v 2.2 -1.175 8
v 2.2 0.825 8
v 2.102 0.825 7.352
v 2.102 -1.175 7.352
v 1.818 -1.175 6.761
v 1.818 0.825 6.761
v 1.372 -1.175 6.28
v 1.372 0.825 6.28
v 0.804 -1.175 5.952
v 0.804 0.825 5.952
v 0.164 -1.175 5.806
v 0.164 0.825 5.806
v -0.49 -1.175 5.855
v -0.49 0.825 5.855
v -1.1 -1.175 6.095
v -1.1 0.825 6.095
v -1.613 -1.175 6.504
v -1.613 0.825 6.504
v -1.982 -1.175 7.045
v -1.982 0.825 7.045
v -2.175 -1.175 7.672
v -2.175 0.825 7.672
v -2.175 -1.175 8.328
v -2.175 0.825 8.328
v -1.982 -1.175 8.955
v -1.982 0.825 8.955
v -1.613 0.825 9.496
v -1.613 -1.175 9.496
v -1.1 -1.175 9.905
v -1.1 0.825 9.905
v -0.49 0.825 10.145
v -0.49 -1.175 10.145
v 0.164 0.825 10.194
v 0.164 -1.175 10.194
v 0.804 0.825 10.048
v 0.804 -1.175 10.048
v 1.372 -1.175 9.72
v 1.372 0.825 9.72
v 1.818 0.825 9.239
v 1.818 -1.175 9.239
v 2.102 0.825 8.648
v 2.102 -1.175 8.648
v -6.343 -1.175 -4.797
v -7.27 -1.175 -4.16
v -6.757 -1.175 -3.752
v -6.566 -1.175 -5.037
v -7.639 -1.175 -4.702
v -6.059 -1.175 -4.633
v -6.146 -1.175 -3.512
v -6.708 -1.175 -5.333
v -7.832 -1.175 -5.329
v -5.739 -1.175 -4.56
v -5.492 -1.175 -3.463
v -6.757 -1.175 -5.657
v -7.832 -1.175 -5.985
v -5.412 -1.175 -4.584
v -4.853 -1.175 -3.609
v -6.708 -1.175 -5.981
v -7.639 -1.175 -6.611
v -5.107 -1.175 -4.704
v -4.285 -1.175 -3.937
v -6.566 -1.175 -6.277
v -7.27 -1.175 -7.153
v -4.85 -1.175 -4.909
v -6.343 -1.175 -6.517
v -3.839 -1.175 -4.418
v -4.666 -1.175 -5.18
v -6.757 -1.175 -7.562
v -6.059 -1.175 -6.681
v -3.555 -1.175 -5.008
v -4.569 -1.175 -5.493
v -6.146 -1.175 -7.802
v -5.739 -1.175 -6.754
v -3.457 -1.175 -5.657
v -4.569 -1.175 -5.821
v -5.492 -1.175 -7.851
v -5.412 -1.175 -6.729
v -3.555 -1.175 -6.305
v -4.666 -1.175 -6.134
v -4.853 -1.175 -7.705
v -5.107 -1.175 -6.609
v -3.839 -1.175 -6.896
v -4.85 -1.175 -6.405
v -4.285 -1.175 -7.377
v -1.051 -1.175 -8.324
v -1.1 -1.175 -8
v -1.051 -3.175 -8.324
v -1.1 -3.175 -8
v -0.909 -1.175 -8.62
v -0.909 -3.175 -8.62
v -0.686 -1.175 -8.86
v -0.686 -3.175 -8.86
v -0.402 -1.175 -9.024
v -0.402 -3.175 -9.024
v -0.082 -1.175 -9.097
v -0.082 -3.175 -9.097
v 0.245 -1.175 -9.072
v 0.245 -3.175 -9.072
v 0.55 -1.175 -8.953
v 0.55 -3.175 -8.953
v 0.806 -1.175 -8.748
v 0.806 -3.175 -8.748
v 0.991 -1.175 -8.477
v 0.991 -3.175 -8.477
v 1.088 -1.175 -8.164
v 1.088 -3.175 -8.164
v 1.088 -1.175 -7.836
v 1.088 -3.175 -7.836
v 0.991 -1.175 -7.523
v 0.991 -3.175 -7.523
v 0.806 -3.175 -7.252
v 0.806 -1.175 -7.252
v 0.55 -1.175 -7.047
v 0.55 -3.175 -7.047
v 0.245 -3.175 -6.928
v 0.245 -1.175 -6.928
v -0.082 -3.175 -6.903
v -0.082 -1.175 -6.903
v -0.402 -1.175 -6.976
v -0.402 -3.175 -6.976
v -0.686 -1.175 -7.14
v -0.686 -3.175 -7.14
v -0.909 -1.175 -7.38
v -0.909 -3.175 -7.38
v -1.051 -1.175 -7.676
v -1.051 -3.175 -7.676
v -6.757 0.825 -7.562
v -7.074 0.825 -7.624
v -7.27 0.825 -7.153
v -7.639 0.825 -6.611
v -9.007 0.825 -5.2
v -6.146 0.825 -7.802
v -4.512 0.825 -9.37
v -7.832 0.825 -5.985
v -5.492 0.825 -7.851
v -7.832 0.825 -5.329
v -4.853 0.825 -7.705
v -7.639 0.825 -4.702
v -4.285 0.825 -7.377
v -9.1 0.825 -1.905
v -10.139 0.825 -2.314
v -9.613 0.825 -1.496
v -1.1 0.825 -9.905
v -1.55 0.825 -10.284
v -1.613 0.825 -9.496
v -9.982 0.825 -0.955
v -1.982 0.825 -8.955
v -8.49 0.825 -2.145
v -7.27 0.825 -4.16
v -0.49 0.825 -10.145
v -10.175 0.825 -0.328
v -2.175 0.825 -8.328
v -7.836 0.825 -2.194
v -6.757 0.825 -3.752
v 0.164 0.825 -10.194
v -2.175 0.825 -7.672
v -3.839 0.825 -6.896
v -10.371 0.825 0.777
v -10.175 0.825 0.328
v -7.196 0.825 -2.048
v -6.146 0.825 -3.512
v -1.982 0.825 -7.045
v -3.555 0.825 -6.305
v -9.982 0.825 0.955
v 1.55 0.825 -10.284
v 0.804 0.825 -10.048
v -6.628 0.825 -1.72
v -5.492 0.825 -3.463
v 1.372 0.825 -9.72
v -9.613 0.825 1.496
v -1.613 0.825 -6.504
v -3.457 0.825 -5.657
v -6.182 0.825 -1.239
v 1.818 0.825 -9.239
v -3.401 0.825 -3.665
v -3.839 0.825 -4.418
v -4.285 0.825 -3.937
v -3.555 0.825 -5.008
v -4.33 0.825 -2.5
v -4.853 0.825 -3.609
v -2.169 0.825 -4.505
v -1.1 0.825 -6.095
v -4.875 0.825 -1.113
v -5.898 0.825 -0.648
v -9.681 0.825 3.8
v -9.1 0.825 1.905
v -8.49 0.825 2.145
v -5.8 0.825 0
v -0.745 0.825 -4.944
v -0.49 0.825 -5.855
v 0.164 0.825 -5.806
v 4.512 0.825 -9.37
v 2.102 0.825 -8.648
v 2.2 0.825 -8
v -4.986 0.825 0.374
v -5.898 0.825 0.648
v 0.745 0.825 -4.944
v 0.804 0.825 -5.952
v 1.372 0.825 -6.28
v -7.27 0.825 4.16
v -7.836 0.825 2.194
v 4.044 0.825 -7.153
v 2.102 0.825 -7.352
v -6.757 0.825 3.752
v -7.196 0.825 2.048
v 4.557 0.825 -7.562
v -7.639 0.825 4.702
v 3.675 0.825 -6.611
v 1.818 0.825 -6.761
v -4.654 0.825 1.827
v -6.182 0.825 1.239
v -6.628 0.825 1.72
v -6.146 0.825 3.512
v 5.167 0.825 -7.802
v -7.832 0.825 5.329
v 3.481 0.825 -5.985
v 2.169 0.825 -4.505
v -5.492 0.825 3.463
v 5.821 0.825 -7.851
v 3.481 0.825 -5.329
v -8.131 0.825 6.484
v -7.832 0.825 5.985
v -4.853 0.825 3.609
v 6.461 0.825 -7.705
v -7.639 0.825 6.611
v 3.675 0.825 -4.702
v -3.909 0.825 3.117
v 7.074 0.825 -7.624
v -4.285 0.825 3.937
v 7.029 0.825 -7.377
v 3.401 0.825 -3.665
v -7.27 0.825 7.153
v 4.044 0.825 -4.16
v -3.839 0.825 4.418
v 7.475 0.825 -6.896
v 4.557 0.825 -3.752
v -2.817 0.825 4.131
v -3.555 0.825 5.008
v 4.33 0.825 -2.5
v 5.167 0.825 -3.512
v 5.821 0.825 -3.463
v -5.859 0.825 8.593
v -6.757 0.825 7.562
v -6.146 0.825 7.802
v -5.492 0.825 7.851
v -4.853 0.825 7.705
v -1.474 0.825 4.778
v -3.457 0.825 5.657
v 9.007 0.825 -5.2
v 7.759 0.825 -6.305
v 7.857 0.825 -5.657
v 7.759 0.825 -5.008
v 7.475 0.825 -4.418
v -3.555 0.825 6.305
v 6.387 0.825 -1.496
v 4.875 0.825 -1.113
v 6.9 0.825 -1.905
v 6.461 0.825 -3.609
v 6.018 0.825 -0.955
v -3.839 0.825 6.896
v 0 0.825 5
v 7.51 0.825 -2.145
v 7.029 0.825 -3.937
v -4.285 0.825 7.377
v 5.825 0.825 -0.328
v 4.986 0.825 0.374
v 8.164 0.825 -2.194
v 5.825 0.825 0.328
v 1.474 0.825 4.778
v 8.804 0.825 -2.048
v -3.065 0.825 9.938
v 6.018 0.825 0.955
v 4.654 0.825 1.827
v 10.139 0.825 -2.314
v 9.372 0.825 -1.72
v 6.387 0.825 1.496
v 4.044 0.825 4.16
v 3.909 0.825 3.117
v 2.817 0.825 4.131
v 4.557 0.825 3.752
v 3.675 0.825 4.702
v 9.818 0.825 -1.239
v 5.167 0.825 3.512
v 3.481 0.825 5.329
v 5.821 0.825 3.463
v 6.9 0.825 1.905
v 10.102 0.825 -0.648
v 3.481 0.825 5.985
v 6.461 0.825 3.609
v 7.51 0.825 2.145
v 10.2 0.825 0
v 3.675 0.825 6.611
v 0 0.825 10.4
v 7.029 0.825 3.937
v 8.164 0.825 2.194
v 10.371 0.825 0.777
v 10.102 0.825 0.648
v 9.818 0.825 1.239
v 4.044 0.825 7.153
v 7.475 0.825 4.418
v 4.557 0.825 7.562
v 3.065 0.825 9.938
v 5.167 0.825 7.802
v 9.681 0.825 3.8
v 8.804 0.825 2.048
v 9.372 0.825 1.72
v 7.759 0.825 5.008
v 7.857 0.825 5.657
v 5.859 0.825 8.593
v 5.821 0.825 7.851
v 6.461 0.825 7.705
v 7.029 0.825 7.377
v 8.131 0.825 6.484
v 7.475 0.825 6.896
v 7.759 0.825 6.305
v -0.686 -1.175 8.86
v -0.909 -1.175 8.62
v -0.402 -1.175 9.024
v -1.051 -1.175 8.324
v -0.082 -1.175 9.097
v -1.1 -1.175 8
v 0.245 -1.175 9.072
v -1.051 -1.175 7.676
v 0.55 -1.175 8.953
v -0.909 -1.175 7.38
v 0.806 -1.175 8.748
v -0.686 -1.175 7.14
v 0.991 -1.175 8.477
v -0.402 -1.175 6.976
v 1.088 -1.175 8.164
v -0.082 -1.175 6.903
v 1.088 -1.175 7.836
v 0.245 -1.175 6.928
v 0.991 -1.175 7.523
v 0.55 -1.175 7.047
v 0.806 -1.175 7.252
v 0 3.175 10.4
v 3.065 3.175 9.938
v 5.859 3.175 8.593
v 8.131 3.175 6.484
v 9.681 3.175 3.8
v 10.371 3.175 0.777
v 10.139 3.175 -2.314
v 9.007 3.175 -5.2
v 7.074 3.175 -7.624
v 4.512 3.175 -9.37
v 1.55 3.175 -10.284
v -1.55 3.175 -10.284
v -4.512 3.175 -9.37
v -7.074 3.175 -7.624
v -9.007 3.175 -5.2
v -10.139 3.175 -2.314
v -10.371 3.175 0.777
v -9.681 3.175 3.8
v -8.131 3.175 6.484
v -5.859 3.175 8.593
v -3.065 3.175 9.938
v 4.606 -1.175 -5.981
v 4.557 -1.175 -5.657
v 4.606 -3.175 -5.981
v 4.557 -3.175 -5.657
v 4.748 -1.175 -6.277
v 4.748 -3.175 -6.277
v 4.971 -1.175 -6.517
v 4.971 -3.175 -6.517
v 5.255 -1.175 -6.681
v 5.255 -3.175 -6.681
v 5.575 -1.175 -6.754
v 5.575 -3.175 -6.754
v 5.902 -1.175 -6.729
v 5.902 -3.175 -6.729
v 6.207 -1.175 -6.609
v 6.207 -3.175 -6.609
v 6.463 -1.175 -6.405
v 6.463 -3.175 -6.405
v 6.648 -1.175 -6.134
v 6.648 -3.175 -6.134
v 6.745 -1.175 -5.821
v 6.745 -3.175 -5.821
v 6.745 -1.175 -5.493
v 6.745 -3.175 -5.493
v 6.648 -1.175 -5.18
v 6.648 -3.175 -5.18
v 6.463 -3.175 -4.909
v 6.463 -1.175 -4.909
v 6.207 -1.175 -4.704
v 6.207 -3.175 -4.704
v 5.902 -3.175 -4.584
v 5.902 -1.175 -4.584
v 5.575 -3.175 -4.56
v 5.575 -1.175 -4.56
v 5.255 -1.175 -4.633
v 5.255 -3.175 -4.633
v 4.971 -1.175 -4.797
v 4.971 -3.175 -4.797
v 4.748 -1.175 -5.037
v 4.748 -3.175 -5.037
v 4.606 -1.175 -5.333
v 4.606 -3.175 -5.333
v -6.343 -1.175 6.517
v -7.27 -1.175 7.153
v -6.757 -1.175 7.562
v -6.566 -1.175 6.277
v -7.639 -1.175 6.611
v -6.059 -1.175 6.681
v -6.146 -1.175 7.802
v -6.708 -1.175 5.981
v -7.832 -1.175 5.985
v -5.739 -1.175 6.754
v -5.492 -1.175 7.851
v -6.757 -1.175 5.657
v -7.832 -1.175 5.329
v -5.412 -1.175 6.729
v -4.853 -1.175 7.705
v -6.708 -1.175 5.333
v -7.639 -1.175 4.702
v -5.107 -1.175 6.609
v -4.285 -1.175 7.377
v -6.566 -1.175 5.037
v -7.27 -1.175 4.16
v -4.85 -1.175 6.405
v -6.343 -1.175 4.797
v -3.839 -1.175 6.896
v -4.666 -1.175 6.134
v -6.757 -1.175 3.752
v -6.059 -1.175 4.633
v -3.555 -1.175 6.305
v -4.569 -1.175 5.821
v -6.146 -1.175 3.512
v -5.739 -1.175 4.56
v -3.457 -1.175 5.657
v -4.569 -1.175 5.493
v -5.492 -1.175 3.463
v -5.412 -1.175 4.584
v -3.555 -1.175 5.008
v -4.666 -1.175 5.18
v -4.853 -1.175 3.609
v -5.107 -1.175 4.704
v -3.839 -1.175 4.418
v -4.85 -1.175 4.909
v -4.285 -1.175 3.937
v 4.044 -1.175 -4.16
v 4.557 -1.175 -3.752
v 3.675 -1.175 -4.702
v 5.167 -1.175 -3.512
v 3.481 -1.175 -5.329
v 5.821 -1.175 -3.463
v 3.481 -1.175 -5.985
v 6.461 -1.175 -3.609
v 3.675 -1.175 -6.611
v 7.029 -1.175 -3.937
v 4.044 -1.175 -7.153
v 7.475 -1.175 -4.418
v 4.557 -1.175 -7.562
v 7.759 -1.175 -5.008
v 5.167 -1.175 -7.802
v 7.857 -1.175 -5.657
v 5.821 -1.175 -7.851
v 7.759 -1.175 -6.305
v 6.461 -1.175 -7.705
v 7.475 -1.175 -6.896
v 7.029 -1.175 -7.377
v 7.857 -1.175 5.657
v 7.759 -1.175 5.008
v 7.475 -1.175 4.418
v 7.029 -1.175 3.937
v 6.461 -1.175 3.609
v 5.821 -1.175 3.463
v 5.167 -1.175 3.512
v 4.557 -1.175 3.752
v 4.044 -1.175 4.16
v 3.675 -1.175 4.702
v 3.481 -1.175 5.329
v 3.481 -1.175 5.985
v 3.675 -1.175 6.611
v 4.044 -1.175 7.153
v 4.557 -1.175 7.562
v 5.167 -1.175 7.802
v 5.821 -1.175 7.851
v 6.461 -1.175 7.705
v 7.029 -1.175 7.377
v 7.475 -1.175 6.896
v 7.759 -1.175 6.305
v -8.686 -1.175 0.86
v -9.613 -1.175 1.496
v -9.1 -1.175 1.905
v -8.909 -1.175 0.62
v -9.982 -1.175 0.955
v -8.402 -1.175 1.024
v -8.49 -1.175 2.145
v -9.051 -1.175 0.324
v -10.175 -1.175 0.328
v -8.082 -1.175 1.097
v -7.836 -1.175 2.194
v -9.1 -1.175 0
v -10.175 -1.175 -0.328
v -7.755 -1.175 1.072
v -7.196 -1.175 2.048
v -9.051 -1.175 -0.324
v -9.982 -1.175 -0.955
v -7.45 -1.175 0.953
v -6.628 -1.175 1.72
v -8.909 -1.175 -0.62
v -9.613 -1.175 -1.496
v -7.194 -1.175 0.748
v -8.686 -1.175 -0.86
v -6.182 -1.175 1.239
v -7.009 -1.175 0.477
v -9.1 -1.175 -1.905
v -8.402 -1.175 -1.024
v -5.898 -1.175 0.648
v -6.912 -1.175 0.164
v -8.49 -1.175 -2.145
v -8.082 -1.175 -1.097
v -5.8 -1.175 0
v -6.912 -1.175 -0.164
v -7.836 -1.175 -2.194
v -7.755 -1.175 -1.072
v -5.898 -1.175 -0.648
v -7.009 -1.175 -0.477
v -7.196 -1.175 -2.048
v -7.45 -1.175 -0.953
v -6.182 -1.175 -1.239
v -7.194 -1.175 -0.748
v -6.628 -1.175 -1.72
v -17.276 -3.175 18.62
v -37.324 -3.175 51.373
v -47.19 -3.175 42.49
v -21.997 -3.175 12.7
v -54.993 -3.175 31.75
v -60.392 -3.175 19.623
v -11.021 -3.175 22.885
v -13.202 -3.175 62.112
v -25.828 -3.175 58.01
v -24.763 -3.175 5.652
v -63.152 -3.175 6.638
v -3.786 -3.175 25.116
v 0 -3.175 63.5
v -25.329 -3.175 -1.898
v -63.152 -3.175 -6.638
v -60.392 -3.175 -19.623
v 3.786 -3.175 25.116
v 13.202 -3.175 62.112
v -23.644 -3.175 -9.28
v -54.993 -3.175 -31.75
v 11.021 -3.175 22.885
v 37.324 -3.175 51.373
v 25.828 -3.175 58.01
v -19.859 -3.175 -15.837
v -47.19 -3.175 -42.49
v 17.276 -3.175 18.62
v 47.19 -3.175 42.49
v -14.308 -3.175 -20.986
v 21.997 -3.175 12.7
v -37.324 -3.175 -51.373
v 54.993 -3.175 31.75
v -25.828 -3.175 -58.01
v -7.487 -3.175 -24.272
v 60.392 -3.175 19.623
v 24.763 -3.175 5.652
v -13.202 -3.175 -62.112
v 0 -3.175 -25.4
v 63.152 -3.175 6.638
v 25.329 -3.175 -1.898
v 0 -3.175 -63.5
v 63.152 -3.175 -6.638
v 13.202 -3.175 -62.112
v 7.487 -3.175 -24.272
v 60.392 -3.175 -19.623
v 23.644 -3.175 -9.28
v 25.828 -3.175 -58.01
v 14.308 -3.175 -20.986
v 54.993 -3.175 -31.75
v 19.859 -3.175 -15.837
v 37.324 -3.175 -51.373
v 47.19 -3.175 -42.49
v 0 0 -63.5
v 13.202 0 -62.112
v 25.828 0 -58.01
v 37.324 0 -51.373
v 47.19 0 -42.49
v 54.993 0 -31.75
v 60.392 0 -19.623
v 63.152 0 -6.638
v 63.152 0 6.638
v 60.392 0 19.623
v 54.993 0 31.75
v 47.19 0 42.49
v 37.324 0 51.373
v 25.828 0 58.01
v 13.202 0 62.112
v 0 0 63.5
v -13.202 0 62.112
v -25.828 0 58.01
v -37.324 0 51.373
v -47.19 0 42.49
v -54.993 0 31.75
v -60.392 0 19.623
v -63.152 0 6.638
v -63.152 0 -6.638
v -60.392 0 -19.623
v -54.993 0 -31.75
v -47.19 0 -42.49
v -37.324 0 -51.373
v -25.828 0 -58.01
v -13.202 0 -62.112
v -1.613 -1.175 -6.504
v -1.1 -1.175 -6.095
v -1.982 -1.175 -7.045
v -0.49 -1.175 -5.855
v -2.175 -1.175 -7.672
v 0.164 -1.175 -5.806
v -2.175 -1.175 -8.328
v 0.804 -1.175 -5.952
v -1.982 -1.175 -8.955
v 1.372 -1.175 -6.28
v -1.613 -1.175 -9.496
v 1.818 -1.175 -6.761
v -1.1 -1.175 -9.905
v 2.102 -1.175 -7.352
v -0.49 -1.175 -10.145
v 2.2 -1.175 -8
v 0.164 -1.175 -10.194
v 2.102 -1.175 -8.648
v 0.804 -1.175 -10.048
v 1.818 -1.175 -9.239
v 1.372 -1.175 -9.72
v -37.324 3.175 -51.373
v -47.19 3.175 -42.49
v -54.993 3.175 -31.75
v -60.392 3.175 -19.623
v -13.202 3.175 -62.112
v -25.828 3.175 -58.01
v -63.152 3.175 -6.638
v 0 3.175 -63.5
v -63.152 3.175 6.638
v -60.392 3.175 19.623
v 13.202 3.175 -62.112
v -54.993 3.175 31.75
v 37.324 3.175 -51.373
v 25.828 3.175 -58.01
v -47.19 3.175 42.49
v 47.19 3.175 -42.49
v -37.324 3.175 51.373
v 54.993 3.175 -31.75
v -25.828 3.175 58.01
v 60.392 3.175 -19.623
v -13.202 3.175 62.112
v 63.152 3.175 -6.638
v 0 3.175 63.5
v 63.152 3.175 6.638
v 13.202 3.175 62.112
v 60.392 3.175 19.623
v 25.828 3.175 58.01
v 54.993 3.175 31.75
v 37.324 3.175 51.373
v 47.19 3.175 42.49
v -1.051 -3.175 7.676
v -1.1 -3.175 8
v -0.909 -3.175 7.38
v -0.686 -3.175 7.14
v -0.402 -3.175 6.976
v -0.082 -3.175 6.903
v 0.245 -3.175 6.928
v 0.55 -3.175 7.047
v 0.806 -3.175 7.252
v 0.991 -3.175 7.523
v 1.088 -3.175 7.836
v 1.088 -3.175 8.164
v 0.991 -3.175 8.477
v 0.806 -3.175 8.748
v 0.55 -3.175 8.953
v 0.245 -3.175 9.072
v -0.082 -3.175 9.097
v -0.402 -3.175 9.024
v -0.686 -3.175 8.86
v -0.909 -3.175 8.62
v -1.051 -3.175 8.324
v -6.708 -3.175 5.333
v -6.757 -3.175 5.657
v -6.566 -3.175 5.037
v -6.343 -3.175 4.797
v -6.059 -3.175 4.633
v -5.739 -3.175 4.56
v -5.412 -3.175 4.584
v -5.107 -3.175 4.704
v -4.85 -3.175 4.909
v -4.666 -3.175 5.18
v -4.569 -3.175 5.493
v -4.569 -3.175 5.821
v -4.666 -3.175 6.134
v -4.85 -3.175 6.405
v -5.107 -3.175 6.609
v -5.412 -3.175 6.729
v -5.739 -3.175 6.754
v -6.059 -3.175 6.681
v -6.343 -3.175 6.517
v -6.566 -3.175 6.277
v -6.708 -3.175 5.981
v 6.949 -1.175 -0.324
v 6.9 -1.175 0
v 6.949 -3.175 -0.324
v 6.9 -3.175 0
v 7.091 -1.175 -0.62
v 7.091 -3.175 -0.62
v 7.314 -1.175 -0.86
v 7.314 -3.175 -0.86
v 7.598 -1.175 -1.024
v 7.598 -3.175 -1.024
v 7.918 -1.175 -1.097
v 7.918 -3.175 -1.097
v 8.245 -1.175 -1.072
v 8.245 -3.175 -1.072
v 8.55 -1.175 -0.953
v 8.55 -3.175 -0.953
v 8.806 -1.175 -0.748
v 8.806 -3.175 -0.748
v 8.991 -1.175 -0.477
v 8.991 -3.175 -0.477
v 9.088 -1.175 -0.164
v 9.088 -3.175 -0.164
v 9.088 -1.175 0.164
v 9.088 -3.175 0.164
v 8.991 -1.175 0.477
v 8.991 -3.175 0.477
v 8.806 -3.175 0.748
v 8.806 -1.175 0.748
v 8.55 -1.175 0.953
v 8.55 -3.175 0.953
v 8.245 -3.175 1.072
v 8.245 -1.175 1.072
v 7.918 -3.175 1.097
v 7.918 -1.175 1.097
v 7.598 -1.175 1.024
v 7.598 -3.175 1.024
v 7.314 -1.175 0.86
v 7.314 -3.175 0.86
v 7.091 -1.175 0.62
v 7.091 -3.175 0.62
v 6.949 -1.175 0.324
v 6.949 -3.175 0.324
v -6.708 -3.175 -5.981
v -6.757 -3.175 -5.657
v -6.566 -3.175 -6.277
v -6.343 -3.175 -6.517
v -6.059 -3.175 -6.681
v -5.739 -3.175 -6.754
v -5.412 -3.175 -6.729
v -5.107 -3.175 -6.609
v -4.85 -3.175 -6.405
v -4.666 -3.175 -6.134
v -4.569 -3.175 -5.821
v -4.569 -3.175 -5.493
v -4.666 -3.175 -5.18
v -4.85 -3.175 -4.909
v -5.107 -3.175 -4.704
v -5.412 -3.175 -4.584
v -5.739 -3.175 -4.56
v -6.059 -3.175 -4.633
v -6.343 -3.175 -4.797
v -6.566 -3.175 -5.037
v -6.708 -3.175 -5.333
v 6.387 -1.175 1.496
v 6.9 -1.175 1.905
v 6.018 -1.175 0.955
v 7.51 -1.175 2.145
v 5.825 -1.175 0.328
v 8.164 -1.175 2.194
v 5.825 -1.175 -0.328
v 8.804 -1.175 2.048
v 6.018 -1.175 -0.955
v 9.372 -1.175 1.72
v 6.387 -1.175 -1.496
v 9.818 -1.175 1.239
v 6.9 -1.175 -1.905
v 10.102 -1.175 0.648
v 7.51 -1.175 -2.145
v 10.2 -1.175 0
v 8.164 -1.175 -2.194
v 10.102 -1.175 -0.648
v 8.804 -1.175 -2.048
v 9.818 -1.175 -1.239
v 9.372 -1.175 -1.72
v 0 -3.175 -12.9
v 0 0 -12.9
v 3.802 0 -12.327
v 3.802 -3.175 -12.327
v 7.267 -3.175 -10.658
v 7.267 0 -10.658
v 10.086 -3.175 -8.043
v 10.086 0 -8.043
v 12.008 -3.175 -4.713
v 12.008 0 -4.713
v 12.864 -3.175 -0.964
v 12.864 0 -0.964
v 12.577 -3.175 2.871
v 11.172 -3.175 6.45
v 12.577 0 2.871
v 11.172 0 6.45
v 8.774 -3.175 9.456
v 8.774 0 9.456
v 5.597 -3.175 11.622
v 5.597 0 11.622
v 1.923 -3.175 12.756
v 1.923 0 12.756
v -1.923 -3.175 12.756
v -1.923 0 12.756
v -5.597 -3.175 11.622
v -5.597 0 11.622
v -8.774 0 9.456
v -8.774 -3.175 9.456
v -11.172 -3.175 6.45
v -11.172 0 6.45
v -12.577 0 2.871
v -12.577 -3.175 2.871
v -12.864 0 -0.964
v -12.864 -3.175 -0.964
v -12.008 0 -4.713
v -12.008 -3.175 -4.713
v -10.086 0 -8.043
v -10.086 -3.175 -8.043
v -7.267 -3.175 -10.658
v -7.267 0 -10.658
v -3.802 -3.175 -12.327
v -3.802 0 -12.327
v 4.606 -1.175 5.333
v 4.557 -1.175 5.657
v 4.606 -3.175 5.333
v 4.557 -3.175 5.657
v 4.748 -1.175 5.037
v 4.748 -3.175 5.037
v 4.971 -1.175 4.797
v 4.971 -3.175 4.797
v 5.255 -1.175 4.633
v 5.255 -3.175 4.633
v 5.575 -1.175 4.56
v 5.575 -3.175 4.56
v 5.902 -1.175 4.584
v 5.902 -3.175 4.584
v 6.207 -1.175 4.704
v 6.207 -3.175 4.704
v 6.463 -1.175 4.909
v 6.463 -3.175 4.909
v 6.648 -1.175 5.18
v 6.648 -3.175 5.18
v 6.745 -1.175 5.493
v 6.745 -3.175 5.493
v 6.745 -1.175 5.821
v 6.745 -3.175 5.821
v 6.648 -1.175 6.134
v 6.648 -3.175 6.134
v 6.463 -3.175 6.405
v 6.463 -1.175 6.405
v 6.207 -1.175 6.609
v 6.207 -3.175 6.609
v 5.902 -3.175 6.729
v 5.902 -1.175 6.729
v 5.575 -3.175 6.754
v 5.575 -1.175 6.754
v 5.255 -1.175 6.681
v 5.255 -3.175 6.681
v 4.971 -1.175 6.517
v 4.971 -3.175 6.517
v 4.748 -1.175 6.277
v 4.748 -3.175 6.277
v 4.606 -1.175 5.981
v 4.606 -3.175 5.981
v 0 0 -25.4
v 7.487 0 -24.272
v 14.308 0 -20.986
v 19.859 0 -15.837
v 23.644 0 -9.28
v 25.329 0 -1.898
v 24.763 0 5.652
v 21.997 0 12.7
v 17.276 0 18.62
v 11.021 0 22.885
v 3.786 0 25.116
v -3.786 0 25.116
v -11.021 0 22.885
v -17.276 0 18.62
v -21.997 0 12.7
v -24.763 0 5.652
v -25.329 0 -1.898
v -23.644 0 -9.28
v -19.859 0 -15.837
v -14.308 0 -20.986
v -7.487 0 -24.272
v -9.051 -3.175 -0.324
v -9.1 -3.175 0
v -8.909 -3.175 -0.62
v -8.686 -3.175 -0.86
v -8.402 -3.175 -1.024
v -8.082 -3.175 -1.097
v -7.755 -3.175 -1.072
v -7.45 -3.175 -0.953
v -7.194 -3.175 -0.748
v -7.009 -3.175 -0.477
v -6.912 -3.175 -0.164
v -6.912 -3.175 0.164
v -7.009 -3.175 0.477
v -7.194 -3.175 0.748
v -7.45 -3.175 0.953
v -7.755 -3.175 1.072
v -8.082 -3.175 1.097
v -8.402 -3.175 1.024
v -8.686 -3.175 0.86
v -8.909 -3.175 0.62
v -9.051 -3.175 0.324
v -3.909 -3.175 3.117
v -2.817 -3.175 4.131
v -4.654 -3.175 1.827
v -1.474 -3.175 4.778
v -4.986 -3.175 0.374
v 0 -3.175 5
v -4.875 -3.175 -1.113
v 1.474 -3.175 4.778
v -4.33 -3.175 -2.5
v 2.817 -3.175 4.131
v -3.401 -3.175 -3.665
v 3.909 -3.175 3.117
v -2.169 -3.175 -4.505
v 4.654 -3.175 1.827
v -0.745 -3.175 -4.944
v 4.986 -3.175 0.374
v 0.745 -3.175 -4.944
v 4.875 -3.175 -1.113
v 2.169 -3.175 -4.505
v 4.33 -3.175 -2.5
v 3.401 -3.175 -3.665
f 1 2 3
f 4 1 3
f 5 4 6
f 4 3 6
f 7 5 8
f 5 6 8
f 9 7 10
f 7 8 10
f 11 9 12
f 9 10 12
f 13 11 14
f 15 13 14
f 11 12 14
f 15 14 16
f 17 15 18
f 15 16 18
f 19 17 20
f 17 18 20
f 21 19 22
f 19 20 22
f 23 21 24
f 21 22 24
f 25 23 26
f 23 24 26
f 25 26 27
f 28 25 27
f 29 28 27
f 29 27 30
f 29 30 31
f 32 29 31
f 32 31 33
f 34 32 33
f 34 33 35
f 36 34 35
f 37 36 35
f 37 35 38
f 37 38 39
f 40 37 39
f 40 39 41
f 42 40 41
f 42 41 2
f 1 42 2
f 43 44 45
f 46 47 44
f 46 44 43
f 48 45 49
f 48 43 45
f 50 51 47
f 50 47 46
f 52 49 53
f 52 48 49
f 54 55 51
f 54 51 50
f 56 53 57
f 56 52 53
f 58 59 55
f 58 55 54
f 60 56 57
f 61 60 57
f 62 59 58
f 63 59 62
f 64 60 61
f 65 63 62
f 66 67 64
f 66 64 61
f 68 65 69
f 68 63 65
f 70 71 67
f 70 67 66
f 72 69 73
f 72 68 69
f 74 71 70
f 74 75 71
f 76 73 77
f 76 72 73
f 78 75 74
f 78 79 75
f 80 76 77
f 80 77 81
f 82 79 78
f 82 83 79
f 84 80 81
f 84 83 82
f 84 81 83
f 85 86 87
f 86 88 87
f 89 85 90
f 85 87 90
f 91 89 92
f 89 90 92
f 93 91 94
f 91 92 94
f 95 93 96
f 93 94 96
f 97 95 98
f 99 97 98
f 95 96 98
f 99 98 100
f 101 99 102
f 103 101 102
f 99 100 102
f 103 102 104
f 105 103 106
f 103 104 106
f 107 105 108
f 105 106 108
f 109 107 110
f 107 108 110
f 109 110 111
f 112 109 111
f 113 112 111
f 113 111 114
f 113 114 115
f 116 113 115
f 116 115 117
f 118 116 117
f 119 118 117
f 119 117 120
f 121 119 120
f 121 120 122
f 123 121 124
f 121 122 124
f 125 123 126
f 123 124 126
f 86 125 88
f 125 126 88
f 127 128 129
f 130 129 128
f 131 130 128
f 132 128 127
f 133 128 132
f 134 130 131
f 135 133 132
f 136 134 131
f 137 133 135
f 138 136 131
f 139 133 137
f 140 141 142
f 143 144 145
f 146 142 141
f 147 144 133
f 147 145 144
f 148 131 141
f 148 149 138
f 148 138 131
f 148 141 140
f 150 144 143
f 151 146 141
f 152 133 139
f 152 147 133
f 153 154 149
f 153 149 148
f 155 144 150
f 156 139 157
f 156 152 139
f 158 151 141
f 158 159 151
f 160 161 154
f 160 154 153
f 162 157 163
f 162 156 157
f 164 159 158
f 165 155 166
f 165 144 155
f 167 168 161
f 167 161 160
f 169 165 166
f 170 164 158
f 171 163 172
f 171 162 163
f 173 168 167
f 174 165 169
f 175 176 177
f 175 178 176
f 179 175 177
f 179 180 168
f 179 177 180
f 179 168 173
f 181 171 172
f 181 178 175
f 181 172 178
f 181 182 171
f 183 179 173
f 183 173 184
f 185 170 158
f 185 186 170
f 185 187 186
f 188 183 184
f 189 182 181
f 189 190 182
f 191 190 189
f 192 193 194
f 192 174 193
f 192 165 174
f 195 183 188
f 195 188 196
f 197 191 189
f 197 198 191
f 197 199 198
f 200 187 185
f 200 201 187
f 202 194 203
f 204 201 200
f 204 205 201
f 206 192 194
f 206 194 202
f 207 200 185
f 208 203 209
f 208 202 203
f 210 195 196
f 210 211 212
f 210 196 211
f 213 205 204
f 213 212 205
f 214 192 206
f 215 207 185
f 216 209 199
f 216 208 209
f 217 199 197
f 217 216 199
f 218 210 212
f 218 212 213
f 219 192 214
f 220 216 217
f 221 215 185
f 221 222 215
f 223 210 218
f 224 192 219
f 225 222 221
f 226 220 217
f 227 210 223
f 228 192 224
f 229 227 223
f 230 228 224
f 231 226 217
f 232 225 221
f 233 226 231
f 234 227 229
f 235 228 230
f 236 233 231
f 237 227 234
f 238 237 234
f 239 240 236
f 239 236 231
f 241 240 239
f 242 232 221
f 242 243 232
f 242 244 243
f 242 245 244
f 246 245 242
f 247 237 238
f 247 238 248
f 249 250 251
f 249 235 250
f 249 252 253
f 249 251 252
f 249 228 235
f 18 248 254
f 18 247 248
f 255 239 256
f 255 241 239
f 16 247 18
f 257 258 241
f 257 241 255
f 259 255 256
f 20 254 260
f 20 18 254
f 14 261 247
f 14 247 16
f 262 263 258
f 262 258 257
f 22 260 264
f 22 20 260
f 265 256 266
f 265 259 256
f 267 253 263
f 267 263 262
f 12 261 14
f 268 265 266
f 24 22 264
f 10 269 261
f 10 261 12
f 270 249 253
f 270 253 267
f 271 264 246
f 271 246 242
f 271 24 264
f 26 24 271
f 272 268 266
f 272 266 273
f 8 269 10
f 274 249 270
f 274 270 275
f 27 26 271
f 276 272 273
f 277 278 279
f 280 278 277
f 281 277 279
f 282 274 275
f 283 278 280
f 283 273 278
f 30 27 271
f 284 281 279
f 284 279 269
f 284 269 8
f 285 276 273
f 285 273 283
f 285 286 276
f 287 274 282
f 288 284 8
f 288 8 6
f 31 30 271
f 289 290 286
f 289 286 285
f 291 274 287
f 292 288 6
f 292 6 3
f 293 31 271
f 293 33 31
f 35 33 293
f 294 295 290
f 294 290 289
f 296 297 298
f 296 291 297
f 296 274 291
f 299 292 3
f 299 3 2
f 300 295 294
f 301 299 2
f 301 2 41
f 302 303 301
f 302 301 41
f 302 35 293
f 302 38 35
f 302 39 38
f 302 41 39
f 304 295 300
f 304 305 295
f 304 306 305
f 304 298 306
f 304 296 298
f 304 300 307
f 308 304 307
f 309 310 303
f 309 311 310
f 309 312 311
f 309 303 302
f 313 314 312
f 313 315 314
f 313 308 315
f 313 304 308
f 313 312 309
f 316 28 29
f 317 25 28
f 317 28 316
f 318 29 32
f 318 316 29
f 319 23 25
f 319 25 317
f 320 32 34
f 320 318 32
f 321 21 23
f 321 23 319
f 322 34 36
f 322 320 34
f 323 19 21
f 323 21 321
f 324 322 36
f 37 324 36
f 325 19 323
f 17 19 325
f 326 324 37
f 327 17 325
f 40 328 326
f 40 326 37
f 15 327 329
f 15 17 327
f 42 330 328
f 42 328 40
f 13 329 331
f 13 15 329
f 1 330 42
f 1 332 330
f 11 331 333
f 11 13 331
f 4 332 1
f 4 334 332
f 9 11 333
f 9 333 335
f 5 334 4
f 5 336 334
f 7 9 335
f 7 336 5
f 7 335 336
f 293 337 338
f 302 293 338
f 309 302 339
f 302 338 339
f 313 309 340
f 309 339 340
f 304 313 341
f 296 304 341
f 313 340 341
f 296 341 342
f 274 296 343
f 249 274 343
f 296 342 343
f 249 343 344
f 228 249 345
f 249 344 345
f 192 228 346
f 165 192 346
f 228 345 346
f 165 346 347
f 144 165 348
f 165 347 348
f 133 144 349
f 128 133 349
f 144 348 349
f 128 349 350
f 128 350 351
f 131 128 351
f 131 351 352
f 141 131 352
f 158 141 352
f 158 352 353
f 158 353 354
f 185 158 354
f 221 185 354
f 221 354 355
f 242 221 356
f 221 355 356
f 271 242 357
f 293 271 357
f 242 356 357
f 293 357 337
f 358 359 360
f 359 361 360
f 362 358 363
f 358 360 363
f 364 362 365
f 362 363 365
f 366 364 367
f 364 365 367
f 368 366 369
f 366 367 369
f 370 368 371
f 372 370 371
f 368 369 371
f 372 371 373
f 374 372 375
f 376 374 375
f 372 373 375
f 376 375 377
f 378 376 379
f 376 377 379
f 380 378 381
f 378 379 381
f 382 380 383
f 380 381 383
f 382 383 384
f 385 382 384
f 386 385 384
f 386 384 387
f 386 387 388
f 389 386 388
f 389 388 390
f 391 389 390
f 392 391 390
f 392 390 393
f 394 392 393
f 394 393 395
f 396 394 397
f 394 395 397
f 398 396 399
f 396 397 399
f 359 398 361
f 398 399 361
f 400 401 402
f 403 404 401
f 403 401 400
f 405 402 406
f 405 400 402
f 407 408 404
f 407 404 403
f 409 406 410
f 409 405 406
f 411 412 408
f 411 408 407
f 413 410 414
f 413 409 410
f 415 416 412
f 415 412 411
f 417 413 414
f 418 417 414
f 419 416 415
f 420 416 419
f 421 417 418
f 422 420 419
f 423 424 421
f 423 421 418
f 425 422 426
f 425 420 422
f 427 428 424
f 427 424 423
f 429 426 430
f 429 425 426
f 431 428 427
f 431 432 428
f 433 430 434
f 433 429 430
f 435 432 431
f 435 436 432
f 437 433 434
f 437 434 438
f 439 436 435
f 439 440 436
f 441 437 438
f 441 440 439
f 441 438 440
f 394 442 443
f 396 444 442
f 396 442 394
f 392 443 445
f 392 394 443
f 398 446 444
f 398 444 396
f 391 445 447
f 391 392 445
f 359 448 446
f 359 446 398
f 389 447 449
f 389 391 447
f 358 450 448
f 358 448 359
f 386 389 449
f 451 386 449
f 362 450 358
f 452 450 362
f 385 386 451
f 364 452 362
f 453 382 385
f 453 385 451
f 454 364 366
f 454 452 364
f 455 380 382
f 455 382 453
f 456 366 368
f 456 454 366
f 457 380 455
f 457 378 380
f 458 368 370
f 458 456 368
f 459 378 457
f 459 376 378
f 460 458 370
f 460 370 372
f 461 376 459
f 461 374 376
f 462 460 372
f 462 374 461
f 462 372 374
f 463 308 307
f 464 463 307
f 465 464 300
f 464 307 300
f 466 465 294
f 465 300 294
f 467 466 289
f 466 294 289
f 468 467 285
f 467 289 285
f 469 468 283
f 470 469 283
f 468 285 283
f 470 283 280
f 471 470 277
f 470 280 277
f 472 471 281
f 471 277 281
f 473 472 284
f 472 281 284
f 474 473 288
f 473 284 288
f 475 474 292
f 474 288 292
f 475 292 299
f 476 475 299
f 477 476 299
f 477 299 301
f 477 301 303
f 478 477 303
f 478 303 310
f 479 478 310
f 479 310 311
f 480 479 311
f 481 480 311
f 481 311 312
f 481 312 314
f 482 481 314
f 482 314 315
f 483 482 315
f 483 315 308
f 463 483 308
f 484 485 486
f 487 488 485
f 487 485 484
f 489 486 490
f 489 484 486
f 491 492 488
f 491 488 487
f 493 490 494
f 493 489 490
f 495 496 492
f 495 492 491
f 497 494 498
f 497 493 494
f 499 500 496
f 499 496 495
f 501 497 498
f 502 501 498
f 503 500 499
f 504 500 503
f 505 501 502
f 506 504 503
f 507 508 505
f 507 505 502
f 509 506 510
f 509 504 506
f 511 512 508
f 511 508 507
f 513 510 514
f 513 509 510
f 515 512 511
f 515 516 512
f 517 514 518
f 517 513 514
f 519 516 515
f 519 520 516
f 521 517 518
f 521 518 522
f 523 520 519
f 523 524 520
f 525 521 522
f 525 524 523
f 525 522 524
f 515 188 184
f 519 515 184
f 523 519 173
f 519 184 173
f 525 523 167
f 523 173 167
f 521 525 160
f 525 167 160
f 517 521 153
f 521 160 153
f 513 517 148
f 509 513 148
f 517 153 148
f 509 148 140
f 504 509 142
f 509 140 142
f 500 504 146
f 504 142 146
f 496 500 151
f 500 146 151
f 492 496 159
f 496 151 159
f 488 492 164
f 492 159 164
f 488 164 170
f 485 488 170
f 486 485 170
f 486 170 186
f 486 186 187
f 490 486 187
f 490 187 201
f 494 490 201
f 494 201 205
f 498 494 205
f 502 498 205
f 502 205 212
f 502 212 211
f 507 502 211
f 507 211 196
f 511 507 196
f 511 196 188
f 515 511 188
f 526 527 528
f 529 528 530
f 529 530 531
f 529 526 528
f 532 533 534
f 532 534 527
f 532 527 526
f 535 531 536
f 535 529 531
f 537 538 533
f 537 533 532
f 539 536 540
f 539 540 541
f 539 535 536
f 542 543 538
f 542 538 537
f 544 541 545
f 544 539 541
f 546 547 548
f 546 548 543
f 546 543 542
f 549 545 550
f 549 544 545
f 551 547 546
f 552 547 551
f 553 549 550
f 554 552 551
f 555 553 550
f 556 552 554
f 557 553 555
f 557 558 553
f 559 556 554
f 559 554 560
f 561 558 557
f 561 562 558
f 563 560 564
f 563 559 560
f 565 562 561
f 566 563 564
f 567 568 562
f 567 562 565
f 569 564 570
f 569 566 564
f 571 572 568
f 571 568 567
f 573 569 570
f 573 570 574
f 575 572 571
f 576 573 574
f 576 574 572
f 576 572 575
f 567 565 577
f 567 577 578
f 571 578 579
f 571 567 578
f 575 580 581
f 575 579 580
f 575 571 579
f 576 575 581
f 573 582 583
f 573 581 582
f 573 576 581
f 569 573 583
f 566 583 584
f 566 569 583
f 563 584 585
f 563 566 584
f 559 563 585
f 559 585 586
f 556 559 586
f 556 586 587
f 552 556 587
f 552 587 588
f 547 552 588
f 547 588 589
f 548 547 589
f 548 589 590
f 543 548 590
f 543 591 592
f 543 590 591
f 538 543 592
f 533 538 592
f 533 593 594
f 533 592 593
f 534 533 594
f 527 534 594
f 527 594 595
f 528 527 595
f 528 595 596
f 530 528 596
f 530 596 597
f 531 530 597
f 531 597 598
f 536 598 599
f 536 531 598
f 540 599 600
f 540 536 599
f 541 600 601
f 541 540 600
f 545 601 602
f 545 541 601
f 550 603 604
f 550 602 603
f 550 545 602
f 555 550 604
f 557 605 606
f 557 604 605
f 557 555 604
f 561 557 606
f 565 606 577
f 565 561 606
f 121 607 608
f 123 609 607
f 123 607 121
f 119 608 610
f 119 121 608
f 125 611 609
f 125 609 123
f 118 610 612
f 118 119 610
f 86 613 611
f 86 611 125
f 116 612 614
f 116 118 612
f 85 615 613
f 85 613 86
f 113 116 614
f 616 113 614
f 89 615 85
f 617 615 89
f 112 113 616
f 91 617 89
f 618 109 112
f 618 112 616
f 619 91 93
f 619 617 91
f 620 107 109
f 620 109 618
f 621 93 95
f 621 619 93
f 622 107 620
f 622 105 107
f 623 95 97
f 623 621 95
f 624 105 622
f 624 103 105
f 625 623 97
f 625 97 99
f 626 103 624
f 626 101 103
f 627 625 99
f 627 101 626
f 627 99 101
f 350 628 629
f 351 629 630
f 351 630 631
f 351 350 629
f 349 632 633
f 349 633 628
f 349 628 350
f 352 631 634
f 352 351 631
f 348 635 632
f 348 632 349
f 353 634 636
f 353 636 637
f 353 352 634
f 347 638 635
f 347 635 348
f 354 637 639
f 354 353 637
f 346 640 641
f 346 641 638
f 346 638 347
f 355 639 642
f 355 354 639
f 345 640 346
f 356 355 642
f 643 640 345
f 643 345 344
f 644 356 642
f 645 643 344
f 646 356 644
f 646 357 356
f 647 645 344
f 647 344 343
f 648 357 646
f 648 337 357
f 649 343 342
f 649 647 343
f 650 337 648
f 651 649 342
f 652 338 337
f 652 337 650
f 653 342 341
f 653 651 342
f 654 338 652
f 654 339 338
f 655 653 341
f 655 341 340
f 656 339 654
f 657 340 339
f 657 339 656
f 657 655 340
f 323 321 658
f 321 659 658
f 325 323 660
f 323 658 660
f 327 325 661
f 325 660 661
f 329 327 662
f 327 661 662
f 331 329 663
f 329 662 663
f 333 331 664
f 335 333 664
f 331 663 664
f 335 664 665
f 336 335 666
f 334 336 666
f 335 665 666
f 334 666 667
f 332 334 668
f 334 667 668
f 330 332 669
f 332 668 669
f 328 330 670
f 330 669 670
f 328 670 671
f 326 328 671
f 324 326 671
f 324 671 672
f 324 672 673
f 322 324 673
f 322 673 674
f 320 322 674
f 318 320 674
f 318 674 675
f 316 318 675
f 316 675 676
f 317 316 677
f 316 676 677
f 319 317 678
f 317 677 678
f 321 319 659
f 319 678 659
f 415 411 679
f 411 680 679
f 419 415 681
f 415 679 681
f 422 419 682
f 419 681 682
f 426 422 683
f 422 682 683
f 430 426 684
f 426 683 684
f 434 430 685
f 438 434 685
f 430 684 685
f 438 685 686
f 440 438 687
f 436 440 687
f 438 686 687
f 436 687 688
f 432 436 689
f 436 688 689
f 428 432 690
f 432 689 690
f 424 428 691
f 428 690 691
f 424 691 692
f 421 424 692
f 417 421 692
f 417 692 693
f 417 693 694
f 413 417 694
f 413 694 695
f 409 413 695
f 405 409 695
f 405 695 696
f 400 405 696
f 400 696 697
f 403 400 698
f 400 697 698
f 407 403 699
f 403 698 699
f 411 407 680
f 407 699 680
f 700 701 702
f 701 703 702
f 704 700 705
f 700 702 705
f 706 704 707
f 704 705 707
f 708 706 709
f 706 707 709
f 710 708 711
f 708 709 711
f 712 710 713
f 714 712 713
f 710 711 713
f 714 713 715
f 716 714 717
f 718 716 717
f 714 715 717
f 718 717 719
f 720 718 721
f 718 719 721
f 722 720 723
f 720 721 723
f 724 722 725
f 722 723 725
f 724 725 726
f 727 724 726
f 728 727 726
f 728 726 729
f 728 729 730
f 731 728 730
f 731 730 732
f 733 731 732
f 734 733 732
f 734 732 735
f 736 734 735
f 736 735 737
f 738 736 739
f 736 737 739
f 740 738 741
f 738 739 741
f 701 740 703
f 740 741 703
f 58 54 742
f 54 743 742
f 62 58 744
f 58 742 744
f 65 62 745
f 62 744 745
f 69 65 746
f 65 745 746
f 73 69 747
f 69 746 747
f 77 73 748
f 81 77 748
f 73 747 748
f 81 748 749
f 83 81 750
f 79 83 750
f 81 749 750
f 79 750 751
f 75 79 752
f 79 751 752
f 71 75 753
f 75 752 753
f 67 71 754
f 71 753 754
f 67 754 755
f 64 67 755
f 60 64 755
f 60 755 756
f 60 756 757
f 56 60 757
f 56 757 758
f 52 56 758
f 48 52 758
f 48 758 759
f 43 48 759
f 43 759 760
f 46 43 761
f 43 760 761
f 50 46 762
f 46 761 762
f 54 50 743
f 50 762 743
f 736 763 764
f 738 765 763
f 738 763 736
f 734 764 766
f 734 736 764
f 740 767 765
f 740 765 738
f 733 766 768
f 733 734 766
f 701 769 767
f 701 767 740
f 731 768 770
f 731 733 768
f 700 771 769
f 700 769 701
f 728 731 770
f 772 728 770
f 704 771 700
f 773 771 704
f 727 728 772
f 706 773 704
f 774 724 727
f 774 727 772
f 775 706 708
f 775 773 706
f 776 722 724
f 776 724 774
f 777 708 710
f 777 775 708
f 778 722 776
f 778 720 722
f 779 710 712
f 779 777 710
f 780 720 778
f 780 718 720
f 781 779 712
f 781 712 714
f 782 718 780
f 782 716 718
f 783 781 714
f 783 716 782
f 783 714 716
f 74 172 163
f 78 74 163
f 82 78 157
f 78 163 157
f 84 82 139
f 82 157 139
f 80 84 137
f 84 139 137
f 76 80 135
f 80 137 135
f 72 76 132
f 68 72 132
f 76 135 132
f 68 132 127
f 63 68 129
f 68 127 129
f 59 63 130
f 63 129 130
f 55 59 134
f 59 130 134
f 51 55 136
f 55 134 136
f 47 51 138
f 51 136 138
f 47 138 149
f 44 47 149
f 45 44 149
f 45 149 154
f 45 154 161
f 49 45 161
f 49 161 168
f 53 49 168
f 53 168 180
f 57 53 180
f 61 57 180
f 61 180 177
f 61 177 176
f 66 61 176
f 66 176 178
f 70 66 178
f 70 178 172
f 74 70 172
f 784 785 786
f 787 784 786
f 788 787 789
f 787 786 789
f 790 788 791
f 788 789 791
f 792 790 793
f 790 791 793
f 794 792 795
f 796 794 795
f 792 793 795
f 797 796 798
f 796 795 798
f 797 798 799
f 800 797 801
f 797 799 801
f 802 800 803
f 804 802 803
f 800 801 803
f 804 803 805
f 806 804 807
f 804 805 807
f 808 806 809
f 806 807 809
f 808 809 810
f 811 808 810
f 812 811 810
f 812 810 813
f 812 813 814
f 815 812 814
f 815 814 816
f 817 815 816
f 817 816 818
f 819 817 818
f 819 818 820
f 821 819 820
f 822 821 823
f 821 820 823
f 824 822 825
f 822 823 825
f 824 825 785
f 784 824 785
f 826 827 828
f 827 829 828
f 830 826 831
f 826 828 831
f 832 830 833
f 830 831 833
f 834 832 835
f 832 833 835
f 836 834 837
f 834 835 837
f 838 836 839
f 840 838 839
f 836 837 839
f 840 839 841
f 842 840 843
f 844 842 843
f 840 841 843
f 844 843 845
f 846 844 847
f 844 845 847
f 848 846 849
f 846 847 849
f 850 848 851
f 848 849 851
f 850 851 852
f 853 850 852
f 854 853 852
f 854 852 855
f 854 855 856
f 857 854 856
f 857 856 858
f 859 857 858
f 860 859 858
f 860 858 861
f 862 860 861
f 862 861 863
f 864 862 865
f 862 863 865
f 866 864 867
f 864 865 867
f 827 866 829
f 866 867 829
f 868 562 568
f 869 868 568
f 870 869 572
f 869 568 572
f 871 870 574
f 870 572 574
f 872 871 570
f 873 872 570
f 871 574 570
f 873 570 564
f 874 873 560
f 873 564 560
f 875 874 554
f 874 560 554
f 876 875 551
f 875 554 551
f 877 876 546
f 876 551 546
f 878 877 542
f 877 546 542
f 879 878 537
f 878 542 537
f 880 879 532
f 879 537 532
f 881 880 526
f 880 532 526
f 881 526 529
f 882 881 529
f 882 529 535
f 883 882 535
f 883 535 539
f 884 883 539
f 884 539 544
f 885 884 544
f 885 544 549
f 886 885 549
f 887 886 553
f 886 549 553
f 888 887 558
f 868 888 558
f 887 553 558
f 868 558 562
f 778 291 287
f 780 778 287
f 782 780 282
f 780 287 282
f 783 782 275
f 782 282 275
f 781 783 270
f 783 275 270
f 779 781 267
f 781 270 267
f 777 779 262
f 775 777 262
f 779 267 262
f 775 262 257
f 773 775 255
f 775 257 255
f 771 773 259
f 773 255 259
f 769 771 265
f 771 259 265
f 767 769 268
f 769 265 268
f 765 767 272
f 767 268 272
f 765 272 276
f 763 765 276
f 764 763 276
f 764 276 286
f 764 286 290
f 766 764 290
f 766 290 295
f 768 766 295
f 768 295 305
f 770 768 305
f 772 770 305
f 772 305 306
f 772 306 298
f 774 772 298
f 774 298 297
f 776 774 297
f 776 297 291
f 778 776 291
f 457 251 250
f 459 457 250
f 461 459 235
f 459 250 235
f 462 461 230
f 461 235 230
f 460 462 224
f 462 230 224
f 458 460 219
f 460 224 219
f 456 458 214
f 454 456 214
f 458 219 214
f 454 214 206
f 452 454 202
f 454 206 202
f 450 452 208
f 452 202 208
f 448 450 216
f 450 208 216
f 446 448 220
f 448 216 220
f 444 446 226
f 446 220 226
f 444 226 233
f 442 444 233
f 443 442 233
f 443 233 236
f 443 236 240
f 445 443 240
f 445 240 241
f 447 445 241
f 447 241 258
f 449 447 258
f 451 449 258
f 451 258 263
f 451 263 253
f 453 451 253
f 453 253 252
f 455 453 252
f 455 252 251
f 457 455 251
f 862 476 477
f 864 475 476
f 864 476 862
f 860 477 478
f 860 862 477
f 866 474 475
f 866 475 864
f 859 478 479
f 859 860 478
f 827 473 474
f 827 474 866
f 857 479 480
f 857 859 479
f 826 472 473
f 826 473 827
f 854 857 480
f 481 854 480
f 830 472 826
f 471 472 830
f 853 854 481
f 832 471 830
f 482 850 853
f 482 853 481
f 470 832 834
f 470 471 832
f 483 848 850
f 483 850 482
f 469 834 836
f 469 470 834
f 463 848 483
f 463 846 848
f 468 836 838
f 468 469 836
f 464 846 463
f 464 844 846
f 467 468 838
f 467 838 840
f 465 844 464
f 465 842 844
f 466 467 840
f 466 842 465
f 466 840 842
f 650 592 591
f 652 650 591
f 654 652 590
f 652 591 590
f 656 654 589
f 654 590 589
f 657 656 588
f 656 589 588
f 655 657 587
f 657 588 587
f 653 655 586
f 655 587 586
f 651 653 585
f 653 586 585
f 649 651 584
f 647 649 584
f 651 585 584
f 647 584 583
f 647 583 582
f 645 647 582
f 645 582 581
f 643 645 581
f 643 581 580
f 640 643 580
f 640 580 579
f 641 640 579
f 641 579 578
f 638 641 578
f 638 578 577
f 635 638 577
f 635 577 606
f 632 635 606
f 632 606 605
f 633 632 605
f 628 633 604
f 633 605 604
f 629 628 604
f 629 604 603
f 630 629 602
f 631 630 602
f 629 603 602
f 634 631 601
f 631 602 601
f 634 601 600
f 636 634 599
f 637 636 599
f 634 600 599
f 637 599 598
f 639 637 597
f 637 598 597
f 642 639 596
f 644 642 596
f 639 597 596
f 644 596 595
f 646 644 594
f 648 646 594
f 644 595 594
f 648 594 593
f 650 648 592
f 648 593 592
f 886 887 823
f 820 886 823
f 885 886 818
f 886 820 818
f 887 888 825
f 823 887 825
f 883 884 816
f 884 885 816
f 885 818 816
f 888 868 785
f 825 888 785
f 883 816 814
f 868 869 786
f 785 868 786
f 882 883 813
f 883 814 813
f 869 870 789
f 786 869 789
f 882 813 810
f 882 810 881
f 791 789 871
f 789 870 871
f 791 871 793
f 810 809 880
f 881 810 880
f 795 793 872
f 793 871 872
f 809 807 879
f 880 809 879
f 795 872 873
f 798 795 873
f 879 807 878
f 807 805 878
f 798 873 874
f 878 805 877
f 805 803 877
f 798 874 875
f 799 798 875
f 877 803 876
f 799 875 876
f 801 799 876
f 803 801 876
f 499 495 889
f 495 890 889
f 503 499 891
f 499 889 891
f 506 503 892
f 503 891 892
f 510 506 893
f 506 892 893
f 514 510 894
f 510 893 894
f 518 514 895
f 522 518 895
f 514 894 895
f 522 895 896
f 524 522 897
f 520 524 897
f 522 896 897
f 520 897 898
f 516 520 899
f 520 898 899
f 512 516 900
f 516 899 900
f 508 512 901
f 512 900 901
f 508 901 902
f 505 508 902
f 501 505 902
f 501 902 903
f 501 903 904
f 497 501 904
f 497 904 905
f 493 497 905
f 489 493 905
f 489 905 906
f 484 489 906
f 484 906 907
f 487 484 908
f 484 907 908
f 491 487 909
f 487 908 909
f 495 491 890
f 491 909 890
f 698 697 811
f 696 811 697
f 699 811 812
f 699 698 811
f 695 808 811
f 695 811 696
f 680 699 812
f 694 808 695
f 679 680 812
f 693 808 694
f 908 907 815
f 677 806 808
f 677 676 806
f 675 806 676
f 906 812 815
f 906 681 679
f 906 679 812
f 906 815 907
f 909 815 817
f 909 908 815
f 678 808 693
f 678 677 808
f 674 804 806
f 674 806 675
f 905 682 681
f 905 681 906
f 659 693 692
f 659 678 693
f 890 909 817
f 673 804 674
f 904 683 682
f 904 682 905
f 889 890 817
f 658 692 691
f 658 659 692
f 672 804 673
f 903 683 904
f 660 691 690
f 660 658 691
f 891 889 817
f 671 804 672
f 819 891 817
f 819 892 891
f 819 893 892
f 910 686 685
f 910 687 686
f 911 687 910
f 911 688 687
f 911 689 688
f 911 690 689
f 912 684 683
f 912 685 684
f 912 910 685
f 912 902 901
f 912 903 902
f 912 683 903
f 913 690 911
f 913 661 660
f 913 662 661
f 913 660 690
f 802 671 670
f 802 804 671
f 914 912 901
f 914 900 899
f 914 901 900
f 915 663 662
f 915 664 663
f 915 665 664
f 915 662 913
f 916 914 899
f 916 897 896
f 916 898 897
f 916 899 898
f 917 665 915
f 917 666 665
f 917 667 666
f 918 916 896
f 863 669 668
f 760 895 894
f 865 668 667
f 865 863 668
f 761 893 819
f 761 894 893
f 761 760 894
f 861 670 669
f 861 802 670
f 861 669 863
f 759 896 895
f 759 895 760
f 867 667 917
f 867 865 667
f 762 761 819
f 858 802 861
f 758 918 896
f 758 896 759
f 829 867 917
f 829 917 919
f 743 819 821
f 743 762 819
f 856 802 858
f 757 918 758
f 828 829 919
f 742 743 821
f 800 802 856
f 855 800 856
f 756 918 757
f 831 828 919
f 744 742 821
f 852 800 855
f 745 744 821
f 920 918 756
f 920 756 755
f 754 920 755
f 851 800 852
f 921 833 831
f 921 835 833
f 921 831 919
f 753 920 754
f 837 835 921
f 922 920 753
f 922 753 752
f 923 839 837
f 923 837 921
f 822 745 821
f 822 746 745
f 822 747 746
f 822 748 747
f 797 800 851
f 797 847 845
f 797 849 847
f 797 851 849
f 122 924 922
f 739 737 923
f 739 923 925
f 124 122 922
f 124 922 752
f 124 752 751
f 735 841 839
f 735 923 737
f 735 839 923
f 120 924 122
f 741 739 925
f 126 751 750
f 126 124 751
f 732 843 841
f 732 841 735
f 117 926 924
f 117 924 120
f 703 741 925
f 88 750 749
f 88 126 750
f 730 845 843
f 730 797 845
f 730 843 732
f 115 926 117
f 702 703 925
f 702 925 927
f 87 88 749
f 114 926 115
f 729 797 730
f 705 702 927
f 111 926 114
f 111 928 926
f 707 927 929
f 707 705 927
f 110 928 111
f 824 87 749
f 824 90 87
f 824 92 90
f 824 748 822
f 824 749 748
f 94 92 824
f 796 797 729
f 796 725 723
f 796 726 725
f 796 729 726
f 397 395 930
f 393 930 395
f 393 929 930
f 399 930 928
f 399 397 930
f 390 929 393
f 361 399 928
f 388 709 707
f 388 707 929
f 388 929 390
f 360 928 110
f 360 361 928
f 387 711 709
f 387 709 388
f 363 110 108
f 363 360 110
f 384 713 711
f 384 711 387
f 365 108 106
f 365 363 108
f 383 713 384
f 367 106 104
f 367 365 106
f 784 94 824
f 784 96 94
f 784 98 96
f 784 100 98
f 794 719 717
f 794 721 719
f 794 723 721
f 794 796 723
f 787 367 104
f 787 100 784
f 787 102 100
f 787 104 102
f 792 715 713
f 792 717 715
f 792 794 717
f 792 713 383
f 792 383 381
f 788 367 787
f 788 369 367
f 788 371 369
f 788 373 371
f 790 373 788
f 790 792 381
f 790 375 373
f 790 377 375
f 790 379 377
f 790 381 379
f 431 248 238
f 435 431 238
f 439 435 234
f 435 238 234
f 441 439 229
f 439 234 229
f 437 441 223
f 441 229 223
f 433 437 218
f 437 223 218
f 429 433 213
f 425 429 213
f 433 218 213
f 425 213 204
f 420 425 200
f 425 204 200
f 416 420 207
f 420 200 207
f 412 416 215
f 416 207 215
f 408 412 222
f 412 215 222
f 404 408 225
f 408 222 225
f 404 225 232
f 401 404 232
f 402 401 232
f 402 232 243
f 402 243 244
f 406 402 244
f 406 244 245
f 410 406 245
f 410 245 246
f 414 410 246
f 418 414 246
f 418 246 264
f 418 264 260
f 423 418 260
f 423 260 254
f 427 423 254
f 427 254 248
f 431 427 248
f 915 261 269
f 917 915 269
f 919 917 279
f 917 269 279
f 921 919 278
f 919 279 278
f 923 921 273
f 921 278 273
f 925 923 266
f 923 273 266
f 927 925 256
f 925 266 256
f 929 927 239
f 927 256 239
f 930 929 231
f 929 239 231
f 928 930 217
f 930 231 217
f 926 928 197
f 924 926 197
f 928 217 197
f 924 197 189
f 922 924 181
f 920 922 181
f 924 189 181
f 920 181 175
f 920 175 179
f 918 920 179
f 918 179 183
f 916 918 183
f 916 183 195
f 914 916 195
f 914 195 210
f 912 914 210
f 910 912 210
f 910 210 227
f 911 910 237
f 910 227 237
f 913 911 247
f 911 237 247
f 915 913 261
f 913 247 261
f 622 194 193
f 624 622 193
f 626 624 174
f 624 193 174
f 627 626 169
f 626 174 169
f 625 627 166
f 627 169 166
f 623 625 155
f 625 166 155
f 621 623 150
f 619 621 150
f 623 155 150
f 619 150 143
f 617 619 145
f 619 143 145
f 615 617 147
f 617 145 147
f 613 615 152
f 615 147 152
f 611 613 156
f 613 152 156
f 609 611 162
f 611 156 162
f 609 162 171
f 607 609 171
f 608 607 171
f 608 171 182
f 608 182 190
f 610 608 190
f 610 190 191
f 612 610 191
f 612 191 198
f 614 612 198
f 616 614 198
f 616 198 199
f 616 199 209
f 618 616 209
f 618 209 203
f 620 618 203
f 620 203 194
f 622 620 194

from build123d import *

# Parameters (mm, degrees)
SKETCH1_R                      = 63.5
BOSS_EXTRUDE1_DEPTH            = 3.175
SKETCH2_R                      = 12.9
BOSS_EXTRUDE2_DEPTH            = 3.175
BOSS_EXTRUDE3_START            = 3.175
SKETCH3_R                      = 63.5
SKETCH3_R_2                    = 25.4
BOSS_EXTRUDE3_DEPTH            = 3.175
SKETCH5_R                      = 10.4
CUT_EXTRUDE1_DEPTH             = 2.35
SKETCH6_R                      = 5
CUT_EXTRUDE2_DEPTH             = 4
CBORE_FOR_M2_SHCS1_D           = 2.2
CBORE_FOR_M2_SHCS1_DEPTH       = 6
CBORE_FOR_M2_SHCS1_CBORE_D     = 4.4
CBORE_FOR_M2_SHCS1_CBORE_DEPTH = 2
CBORE_FOR_M2_SHCS1_TIP         = 0.660946681


with BuildPart() as part:
    # Sketch1 → Boss-Extrude1 (new body)
    with BuildSketch(Plane(origin=(0, 0, 0), x_dir=(1, 0, 0), z_dir=(0, 1, 0))):
        with Locations(Location((0, 0, 0), (0, 0, 270))):
            Circle(SKETCH1_R)
    extrude(amount=BOSS_EXTRUDE1_DEPTH)

    # Sketch2 → Boss-Extrude2 (add)
    with BuildSketch(Plane.XZ):
        with Locations(Location((0, 0, 0), (0, 0, 270))):
            Circle(SKETCH2_R)
    extrude(amount=BOSS_EXTRUDE2_DEPTH)

    # Sketch3 → Boss-Extrude3 (add)
    with BuildSketch(Plane.XZ.offset(BOSS_EXTRUDE3_START)):
        with Locations(Location((0, 0, 0), (0, 0, 270))):
            Circle(SKETCH3_R)
        with Locations(Location((0, 0, 0), (0, 0, 270))):
            Circle(SKETCH3_R_2, mode=Mode.SUBTRACT)
    extrude(amount=-BOSS_EXTRUDE3_DEPTH)

    # Sketch5 → Cut-Extrude1 (cut)
    with BuildSketch(Plane(origin=(0, 3.175, 0), x_dir=(1, 0, 0), z_dir=(0, 1, 0))):
        with Locations(Location((0, 0, 0), (0, 0, 270))):
            Circle(SKETCH5_R)
    extrude(amount=-CUT_EXTRUDE1_DEPTH, mode=Mode.SUBTRACT)

    # Sketch6 → Cut-Extrude2 (cut)
    with BuildSketch(Plane(origin=(0, 0.825, 0), x_dir=(1, 0, 0), z_dir=(0, 1, 0))):
        with Locations(Location((0, 0, 0), (0, 0, 270))):
            Circle(SKETCH6_R)
    extrude(amount=-CUT_EXTRUDE2_DEPTH, mode=Mode.SUBTRACT)

    # CBORE for M2 SHCS1
    with Locations(Plane(origin=(0, 0.825, 0), x_dir=(1, 0, 0), z_dir=(0, 1, 0))):
        with Locations((-5.65685425, 5.65685425), (0, 8), (5.65685425, 5.65685425), (8, 0), (5.65685425, -5.65685425), (0, -8), (-5.65685425, -5.65685425), (-8, 0)):
            CounterBoreHole(CBORE_FOR_M2_SHCS1_D / 2, CBORE_FOR_M2_SHCS1_CBORE_D / 2, CBORE_FOR_M2_SHCS1_CBORE_DEPTH, depth=CBORE_FOR_M2_SHCS1_DEPTH)
            with Locations((0, 0, -(CBORE_FOR_M2_SHCS1_DEPTH + CBORE_FOR_M2_SHCS1_TIP / 2))):  # 118° drill point
                Cone(0, CBORE_FOR_M2_SHCS1_D / 2, CBORE_FOR_M2_SHCS1_TIP, mode=Mode.SUBTRACT)


solid = part.part
